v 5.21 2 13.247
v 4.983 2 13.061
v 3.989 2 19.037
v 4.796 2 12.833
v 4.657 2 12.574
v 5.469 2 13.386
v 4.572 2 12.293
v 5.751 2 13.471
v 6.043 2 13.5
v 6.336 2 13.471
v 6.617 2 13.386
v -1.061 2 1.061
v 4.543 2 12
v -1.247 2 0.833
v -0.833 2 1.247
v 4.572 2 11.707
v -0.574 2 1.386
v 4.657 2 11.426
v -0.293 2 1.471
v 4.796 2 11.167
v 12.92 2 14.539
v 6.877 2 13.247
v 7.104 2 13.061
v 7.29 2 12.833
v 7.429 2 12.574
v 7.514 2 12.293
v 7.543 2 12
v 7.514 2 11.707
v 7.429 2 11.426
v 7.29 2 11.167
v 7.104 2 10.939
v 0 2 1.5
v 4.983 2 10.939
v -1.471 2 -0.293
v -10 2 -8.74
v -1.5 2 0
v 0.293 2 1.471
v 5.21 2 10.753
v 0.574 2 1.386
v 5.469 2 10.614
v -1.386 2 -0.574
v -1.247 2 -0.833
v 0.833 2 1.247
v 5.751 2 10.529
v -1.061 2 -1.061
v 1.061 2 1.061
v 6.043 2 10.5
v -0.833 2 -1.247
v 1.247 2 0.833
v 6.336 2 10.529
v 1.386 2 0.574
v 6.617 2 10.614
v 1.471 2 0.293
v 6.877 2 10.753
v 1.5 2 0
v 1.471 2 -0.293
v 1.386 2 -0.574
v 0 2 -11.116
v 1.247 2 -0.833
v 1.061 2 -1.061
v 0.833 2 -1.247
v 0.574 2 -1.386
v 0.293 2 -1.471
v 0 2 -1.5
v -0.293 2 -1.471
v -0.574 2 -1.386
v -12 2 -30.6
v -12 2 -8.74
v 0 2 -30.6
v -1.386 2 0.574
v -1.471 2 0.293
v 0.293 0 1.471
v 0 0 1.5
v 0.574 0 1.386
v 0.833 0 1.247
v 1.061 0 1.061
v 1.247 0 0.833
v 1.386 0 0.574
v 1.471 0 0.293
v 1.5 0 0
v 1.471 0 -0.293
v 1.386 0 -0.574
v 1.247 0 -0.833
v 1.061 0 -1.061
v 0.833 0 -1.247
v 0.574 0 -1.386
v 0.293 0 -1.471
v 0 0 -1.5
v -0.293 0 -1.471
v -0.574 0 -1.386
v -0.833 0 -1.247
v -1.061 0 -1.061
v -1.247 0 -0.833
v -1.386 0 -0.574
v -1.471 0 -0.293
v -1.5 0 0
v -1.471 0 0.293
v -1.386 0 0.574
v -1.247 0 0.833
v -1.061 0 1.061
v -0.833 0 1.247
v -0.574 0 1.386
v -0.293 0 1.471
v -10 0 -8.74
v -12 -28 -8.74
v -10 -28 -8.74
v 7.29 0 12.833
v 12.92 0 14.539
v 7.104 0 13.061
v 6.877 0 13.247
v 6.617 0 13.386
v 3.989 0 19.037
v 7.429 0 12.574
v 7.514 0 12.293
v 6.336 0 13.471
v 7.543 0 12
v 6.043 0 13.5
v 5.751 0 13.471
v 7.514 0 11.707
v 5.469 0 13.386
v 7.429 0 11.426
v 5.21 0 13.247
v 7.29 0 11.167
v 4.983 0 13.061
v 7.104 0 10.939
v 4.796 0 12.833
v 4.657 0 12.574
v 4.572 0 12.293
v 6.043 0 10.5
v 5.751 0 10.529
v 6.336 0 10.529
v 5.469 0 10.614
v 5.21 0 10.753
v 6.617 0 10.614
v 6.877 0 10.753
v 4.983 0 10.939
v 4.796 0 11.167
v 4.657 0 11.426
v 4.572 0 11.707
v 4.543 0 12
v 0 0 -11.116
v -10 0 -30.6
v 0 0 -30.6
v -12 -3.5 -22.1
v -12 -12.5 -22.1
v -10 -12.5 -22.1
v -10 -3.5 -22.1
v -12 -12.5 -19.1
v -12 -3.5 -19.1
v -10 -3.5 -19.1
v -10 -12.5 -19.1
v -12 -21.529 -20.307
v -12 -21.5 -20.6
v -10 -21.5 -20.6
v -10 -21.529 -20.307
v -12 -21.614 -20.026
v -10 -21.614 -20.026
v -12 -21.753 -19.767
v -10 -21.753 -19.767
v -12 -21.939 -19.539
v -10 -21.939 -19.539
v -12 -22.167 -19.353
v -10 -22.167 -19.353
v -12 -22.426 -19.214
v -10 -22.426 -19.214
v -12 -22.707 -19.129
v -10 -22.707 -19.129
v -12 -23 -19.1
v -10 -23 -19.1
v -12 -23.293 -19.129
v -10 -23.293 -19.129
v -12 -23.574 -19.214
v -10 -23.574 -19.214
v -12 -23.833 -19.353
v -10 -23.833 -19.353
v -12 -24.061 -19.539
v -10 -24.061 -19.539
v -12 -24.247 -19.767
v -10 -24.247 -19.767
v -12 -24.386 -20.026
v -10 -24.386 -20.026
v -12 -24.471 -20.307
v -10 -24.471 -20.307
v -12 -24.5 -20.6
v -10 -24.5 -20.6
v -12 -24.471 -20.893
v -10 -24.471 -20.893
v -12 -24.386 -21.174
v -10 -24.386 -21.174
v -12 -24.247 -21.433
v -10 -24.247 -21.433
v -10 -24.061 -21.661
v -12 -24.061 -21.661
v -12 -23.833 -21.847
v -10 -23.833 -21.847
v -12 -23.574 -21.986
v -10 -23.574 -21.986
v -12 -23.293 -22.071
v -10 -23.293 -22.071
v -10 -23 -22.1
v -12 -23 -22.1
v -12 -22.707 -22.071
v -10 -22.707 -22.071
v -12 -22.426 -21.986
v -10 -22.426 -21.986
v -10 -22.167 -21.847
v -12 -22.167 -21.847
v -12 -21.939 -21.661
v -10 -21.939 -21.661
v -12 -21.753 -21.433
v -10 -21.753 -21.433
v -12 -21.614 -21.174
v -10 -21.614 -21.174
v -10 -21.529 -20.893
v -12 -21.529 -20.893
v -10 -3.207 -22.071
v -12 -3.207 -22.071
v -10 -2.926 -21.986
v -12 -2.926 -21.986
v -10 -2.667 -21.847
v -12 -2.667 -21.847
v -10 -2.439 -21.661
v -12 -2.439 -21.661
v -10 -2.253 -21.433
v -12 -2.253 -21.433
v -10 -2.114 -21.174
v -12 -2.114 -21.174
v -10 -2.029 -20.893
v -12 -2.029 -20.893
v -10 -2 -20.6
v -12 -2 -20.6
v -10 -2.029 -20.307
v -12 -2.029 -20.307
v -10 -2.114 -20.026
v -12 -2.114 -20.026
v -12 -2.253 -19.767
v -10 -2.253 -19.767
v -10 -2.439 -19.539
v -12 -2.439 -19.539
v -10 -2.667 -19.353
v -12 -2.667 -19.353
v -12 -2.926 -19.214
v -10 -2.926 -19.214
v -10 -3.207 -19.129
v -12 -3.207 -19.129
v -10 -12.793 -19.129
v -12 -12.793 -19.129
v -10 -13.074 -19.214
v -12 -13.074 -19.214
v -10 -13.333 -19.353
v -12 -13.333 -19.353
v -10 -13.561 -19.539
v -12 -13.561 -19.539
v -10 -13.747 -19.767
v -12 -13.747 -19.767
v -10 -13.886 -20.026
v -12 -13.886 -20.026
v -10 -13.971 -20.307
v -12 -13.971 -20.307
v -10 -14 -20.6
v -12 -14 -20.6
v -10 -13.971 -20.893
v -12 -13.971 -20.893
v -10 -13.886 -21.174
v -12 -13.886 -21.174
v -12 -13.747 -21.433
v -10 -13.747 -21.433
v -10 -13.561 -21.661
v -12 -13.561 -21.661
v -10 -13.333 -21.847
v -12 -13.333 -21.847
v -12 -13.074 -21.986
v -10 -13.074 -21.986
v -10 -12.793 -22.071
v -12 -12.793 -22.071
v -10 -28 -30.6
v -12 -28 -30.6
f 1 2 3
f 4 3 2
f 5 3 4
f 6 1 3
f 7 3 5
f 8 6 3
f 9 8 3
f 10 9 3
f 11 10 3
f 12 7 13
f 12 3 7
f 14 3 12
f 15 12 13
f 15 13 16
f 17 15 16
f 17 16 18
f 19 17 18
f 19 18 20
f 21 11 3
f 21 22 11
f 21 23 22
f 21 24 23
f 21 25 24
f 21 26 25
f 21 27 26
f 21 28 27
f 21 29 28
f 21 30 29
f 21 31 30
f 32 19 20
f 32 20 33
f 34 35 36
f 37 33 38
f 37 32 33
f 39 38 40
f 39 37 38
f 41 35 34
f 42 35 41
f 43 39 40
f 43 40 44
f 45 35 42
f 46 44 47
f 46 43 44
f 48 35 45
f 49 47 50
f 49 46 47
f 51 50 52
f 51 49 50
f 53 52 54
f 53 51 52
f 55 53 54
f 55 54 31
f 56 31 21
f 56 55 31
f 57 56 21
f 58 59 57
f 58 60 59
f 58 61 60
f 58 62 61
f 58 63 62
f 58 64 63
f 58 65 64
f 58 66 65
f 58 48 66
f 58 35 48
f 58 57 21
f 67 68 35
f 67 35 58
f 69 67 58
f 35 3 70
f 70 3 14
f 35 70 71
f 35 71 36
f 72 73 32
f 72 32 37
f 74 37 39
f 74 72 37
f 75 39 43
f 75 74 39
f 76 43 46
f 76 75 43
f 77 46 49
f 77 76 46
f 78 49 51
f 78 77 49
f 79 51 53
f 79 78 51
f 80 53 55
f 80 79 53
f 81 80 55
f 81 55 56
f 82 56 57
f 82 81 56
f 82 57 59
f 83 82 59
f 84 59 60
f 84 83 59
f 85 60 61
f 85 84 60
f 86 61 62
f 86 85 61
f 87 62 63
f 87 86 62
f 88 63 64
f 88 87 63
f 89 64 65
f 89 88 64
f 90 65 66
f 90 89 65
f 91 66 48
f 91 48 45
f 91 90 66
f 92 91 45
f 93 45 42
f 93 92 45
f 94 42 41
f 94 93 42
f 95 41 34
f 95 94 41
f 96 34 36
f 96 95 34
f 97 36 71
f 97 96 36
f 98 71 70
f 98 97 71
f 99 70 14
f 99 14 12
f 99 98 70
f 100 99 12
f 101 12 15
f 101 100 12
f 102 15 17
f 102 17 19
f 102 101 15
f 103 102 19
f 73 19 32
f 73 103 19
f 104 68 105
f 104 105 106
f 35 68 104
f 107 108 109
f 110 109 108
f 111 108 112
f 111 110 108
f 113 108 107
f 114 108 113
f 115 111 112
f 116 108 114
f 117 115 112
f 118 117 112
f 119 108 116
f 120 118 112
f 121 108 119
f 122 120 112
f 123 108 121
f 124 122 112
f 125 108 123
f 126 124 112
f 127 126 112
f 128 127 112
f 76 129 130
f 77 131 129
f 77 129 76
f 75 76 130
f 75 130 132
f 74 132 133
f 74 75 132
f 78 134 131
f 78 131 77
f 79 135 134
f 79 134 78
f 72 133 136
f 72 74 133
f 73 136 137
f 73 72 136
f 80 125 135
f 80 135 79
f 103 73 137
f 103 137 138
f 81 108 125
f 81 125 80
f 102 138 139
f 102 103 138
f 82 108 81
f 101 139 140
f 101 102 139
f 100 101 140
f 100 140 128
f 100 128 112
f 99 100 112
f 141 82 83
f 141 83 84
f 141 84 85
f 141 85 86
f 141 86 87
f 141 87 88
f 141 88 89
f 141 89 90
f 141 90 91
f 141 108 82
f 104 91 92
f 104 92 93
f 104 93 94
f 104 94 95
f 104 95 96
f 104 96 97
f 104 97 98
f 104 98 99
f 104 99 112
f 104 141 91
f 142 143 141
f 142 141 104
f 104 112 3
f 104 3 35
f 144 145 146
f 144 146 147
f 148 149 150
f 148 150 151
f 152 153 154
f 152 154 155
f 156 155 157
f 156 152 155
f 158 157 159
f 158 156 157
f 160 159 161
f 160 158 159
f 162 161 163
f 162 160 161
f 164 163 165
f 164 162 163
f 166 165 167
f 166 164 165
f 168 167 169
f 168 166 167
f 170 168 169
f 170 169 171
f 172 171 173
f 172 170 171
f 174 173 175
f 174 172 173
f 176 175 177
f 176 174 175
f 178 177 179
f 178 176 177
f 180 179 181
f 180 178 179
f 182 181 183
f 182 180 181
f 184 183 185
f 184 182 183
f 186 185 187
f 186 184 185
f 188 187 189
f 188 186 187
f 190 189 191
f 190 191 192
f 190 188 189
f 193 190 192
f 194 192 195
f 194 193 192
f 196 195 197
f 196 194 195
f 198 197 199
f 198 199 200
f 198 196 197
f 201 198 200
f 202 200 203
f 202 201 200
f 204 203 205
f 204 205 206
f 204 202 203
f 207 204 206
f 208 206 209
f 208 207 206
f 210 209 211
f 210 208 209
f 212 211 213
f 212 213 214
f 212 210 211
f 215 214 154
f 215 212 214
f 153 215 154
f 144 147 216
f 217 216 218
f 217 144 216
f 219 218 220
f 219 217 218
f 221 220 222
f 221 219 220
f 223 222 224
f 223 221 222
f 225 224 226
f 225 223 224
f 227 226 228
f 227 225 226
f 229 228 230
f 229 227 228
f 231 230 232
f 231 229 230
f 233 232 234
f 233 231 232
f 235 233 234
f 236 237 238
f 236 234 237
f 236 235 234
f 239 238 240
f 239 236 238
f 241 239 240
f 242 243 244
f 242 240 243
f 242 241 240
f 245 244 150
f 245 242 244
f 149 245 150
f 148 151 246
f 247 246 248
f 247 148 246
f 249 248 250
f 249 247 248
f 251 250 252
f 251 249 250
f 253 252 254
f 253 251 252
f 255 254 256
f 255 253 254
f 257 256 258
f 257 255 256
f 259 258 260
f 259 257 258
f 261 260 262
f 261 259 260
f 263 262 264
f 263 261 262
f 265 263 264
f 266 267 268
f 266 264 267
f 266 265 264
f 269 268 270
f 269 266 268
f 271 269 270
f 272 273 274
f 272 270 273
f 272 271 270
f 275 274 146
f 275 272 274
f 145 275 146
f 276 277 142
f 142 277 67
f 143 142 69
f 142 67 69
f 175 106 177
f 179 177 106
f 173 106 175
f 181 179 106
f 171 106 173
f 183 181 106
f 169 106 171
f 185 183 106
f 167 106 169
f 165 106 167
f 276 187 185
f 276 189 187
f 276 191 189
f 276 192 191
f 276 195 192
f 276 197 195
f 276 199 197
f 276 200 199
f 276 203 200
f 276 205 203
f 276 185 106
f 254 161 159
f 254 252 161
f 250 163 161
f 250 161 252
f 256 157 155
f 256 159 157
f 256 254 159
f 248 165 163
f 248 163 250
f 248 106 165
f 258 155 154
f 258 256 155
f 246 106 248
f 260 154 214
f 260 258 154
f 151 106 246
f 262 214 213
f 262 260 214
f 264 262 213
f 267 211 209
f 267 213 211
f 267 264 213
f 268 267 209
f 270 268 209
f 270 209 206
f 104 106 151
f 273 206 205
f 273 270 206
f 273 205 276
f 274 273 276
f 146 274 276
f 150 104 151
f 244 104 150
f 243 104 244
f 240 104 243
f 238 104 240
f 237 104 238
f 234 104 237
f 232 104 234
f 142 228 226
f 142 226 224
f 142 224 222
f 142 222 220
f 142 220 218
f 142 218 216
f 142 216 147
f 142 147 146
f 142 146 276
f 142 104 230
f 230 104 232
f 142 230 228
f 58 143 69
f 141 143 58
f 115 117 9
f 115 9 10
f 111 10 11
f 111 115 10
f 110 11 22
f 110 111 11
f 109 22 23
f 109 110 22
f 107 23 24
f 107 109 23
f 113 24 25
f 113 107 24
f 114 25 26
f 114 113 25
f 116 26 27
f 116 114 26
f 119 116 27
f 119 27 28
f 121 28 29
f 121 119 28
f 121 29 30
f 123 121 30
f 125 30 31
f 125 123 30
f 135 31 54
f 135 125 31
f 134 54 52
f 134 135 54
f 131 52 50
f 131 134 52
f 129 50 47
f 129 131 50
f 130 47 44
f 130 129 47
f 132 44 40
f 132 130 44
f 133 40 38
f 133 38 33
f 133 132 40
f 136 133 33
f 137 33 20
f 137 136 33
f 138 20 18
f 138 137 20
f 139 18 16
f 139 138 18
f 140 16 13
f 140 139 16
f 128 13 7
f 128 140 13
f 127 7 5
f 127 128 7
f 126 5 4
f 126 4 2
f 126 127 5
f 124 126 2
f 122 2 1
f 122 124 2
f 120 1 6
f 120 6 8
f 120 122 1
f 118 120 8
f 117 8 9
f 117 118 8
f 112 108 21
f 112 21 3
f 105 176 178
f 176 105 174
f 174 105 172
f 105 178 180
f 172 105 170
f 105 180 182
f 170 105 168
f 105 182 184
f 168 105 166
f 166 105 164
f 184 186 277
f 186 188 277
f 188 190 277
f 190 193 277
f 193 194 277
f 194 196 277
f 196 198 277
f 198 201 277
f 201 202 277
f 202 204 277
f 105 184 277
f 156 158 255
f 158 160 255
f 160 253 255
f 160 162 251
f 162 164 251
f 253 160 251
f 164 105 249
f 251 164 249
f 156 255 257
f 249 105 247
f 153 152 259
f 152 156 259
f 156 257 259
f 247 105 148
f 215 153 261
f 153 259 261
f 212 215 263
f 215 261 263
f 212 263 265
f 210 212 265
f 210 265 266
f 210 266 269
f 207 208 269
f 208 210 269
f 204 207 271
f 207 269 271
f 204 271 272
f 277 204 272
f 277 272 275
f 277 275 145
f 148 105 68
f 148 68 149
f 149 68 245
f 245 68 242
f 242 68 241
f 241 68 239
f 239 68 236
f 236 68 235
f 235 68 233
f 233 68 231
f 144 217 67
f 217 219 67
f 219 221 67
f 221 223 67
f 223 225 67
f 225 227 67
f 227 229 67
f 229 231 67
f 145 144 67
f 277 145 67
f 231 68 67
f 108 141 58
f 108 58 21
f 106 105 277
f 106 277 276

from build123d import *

# Parameters (mm, degrees)
SKETCH1_R              = 1.5
BOSS_EXTRUDE1_DEPTH    = 2
SKETCH2_W              = 2
SKETCH2_H              = 21.859501482
BOSS_EXTRUDE3_DEPTH    = 30
CUT_EXTRUDE1_START     = -12
CUT_EXTRUDE1_OUTLINE_R = 1.5
CUT_EXTRUDE1_DEPTH     = 2
CUT_EXTRUDE2_DEPTH     = 30


# Read off the part's stored shape, not the designer's step: Cut-Extrude1
with BuildPart() as part:
    # Sketch1 → Boss-Extrude1 (new body)
    with BuildSketch(Plane(origin=(0, 0, 0), x_dir=(1, 0, 0), z_dir=(0, 1, 0))):
        Polygon((-10, 30.6), (0, 30.6), (0, 11.116380148), (12.920279645, -14.539262377), (3.988919615, -19.037129429), (-10, 8.740498518), align=None)
        with Locations(Location((0, 0, 0), (0, 0, 270))):
            Circle(SKETCH1_R, mode=Mode.SUBTRACT)
        with Locations(Location((6.043245871, -12, 0), (0, 0, 270))):
            Circle(SKETCH1_R, mode=Mode.SUBTRACT)
    extrude(amount=BOSS_EXTRUDE1_DEPTH)

    # Sketch2 → Boss-Extrude3 (add)
    with BuildSketch(Plane(origin=(0, 2, 0), x_dir=(1, 0, 0), z_dir=(0, 1, 0))):
        with Locations((-11, 19.670249259)):
            Rectangle(SKETCH2_W, SKETCH2_H)
    extrude(amount=-BOSS_EXTRUDE3_DEPTH)

    # Cut-Extrude1 outline → Cut-Extrude1 (cut)
    with BuildSketch(Plane.YZ.offset(CUT_EXTRUDE1_START)):
        with Locations((-23, -20.6)):
            Circle(CUT_EXTRUDE1_OUTLINE_R)
    extrude(amount=CUT_EXTRUDE1_DEPTH, mode=Mode.SUBTRACT)

    # Sketch4 → Cut-Extrude2 (cut)
    with BuildSketch(Plane.ZY.offset(12)):
        with BuildLine():
            Line((-19.1, -3.5), (-19.1, -12.5))
            ThreePointArc((-19.1, -12.5), (-20.6, -14), (-22.1, -12.5))
            Line((-22.1, -12.5), (-22.1, -3.5))
            ThreePointArc((-22.1, -3.5), (-20.6, -2), (-19.1, -3.5))
        make_face()
    extrude(amount=-CUT_EXTRUDE2_DEPTH, mode=Mode.SUBTRACT)


solid = part.part
